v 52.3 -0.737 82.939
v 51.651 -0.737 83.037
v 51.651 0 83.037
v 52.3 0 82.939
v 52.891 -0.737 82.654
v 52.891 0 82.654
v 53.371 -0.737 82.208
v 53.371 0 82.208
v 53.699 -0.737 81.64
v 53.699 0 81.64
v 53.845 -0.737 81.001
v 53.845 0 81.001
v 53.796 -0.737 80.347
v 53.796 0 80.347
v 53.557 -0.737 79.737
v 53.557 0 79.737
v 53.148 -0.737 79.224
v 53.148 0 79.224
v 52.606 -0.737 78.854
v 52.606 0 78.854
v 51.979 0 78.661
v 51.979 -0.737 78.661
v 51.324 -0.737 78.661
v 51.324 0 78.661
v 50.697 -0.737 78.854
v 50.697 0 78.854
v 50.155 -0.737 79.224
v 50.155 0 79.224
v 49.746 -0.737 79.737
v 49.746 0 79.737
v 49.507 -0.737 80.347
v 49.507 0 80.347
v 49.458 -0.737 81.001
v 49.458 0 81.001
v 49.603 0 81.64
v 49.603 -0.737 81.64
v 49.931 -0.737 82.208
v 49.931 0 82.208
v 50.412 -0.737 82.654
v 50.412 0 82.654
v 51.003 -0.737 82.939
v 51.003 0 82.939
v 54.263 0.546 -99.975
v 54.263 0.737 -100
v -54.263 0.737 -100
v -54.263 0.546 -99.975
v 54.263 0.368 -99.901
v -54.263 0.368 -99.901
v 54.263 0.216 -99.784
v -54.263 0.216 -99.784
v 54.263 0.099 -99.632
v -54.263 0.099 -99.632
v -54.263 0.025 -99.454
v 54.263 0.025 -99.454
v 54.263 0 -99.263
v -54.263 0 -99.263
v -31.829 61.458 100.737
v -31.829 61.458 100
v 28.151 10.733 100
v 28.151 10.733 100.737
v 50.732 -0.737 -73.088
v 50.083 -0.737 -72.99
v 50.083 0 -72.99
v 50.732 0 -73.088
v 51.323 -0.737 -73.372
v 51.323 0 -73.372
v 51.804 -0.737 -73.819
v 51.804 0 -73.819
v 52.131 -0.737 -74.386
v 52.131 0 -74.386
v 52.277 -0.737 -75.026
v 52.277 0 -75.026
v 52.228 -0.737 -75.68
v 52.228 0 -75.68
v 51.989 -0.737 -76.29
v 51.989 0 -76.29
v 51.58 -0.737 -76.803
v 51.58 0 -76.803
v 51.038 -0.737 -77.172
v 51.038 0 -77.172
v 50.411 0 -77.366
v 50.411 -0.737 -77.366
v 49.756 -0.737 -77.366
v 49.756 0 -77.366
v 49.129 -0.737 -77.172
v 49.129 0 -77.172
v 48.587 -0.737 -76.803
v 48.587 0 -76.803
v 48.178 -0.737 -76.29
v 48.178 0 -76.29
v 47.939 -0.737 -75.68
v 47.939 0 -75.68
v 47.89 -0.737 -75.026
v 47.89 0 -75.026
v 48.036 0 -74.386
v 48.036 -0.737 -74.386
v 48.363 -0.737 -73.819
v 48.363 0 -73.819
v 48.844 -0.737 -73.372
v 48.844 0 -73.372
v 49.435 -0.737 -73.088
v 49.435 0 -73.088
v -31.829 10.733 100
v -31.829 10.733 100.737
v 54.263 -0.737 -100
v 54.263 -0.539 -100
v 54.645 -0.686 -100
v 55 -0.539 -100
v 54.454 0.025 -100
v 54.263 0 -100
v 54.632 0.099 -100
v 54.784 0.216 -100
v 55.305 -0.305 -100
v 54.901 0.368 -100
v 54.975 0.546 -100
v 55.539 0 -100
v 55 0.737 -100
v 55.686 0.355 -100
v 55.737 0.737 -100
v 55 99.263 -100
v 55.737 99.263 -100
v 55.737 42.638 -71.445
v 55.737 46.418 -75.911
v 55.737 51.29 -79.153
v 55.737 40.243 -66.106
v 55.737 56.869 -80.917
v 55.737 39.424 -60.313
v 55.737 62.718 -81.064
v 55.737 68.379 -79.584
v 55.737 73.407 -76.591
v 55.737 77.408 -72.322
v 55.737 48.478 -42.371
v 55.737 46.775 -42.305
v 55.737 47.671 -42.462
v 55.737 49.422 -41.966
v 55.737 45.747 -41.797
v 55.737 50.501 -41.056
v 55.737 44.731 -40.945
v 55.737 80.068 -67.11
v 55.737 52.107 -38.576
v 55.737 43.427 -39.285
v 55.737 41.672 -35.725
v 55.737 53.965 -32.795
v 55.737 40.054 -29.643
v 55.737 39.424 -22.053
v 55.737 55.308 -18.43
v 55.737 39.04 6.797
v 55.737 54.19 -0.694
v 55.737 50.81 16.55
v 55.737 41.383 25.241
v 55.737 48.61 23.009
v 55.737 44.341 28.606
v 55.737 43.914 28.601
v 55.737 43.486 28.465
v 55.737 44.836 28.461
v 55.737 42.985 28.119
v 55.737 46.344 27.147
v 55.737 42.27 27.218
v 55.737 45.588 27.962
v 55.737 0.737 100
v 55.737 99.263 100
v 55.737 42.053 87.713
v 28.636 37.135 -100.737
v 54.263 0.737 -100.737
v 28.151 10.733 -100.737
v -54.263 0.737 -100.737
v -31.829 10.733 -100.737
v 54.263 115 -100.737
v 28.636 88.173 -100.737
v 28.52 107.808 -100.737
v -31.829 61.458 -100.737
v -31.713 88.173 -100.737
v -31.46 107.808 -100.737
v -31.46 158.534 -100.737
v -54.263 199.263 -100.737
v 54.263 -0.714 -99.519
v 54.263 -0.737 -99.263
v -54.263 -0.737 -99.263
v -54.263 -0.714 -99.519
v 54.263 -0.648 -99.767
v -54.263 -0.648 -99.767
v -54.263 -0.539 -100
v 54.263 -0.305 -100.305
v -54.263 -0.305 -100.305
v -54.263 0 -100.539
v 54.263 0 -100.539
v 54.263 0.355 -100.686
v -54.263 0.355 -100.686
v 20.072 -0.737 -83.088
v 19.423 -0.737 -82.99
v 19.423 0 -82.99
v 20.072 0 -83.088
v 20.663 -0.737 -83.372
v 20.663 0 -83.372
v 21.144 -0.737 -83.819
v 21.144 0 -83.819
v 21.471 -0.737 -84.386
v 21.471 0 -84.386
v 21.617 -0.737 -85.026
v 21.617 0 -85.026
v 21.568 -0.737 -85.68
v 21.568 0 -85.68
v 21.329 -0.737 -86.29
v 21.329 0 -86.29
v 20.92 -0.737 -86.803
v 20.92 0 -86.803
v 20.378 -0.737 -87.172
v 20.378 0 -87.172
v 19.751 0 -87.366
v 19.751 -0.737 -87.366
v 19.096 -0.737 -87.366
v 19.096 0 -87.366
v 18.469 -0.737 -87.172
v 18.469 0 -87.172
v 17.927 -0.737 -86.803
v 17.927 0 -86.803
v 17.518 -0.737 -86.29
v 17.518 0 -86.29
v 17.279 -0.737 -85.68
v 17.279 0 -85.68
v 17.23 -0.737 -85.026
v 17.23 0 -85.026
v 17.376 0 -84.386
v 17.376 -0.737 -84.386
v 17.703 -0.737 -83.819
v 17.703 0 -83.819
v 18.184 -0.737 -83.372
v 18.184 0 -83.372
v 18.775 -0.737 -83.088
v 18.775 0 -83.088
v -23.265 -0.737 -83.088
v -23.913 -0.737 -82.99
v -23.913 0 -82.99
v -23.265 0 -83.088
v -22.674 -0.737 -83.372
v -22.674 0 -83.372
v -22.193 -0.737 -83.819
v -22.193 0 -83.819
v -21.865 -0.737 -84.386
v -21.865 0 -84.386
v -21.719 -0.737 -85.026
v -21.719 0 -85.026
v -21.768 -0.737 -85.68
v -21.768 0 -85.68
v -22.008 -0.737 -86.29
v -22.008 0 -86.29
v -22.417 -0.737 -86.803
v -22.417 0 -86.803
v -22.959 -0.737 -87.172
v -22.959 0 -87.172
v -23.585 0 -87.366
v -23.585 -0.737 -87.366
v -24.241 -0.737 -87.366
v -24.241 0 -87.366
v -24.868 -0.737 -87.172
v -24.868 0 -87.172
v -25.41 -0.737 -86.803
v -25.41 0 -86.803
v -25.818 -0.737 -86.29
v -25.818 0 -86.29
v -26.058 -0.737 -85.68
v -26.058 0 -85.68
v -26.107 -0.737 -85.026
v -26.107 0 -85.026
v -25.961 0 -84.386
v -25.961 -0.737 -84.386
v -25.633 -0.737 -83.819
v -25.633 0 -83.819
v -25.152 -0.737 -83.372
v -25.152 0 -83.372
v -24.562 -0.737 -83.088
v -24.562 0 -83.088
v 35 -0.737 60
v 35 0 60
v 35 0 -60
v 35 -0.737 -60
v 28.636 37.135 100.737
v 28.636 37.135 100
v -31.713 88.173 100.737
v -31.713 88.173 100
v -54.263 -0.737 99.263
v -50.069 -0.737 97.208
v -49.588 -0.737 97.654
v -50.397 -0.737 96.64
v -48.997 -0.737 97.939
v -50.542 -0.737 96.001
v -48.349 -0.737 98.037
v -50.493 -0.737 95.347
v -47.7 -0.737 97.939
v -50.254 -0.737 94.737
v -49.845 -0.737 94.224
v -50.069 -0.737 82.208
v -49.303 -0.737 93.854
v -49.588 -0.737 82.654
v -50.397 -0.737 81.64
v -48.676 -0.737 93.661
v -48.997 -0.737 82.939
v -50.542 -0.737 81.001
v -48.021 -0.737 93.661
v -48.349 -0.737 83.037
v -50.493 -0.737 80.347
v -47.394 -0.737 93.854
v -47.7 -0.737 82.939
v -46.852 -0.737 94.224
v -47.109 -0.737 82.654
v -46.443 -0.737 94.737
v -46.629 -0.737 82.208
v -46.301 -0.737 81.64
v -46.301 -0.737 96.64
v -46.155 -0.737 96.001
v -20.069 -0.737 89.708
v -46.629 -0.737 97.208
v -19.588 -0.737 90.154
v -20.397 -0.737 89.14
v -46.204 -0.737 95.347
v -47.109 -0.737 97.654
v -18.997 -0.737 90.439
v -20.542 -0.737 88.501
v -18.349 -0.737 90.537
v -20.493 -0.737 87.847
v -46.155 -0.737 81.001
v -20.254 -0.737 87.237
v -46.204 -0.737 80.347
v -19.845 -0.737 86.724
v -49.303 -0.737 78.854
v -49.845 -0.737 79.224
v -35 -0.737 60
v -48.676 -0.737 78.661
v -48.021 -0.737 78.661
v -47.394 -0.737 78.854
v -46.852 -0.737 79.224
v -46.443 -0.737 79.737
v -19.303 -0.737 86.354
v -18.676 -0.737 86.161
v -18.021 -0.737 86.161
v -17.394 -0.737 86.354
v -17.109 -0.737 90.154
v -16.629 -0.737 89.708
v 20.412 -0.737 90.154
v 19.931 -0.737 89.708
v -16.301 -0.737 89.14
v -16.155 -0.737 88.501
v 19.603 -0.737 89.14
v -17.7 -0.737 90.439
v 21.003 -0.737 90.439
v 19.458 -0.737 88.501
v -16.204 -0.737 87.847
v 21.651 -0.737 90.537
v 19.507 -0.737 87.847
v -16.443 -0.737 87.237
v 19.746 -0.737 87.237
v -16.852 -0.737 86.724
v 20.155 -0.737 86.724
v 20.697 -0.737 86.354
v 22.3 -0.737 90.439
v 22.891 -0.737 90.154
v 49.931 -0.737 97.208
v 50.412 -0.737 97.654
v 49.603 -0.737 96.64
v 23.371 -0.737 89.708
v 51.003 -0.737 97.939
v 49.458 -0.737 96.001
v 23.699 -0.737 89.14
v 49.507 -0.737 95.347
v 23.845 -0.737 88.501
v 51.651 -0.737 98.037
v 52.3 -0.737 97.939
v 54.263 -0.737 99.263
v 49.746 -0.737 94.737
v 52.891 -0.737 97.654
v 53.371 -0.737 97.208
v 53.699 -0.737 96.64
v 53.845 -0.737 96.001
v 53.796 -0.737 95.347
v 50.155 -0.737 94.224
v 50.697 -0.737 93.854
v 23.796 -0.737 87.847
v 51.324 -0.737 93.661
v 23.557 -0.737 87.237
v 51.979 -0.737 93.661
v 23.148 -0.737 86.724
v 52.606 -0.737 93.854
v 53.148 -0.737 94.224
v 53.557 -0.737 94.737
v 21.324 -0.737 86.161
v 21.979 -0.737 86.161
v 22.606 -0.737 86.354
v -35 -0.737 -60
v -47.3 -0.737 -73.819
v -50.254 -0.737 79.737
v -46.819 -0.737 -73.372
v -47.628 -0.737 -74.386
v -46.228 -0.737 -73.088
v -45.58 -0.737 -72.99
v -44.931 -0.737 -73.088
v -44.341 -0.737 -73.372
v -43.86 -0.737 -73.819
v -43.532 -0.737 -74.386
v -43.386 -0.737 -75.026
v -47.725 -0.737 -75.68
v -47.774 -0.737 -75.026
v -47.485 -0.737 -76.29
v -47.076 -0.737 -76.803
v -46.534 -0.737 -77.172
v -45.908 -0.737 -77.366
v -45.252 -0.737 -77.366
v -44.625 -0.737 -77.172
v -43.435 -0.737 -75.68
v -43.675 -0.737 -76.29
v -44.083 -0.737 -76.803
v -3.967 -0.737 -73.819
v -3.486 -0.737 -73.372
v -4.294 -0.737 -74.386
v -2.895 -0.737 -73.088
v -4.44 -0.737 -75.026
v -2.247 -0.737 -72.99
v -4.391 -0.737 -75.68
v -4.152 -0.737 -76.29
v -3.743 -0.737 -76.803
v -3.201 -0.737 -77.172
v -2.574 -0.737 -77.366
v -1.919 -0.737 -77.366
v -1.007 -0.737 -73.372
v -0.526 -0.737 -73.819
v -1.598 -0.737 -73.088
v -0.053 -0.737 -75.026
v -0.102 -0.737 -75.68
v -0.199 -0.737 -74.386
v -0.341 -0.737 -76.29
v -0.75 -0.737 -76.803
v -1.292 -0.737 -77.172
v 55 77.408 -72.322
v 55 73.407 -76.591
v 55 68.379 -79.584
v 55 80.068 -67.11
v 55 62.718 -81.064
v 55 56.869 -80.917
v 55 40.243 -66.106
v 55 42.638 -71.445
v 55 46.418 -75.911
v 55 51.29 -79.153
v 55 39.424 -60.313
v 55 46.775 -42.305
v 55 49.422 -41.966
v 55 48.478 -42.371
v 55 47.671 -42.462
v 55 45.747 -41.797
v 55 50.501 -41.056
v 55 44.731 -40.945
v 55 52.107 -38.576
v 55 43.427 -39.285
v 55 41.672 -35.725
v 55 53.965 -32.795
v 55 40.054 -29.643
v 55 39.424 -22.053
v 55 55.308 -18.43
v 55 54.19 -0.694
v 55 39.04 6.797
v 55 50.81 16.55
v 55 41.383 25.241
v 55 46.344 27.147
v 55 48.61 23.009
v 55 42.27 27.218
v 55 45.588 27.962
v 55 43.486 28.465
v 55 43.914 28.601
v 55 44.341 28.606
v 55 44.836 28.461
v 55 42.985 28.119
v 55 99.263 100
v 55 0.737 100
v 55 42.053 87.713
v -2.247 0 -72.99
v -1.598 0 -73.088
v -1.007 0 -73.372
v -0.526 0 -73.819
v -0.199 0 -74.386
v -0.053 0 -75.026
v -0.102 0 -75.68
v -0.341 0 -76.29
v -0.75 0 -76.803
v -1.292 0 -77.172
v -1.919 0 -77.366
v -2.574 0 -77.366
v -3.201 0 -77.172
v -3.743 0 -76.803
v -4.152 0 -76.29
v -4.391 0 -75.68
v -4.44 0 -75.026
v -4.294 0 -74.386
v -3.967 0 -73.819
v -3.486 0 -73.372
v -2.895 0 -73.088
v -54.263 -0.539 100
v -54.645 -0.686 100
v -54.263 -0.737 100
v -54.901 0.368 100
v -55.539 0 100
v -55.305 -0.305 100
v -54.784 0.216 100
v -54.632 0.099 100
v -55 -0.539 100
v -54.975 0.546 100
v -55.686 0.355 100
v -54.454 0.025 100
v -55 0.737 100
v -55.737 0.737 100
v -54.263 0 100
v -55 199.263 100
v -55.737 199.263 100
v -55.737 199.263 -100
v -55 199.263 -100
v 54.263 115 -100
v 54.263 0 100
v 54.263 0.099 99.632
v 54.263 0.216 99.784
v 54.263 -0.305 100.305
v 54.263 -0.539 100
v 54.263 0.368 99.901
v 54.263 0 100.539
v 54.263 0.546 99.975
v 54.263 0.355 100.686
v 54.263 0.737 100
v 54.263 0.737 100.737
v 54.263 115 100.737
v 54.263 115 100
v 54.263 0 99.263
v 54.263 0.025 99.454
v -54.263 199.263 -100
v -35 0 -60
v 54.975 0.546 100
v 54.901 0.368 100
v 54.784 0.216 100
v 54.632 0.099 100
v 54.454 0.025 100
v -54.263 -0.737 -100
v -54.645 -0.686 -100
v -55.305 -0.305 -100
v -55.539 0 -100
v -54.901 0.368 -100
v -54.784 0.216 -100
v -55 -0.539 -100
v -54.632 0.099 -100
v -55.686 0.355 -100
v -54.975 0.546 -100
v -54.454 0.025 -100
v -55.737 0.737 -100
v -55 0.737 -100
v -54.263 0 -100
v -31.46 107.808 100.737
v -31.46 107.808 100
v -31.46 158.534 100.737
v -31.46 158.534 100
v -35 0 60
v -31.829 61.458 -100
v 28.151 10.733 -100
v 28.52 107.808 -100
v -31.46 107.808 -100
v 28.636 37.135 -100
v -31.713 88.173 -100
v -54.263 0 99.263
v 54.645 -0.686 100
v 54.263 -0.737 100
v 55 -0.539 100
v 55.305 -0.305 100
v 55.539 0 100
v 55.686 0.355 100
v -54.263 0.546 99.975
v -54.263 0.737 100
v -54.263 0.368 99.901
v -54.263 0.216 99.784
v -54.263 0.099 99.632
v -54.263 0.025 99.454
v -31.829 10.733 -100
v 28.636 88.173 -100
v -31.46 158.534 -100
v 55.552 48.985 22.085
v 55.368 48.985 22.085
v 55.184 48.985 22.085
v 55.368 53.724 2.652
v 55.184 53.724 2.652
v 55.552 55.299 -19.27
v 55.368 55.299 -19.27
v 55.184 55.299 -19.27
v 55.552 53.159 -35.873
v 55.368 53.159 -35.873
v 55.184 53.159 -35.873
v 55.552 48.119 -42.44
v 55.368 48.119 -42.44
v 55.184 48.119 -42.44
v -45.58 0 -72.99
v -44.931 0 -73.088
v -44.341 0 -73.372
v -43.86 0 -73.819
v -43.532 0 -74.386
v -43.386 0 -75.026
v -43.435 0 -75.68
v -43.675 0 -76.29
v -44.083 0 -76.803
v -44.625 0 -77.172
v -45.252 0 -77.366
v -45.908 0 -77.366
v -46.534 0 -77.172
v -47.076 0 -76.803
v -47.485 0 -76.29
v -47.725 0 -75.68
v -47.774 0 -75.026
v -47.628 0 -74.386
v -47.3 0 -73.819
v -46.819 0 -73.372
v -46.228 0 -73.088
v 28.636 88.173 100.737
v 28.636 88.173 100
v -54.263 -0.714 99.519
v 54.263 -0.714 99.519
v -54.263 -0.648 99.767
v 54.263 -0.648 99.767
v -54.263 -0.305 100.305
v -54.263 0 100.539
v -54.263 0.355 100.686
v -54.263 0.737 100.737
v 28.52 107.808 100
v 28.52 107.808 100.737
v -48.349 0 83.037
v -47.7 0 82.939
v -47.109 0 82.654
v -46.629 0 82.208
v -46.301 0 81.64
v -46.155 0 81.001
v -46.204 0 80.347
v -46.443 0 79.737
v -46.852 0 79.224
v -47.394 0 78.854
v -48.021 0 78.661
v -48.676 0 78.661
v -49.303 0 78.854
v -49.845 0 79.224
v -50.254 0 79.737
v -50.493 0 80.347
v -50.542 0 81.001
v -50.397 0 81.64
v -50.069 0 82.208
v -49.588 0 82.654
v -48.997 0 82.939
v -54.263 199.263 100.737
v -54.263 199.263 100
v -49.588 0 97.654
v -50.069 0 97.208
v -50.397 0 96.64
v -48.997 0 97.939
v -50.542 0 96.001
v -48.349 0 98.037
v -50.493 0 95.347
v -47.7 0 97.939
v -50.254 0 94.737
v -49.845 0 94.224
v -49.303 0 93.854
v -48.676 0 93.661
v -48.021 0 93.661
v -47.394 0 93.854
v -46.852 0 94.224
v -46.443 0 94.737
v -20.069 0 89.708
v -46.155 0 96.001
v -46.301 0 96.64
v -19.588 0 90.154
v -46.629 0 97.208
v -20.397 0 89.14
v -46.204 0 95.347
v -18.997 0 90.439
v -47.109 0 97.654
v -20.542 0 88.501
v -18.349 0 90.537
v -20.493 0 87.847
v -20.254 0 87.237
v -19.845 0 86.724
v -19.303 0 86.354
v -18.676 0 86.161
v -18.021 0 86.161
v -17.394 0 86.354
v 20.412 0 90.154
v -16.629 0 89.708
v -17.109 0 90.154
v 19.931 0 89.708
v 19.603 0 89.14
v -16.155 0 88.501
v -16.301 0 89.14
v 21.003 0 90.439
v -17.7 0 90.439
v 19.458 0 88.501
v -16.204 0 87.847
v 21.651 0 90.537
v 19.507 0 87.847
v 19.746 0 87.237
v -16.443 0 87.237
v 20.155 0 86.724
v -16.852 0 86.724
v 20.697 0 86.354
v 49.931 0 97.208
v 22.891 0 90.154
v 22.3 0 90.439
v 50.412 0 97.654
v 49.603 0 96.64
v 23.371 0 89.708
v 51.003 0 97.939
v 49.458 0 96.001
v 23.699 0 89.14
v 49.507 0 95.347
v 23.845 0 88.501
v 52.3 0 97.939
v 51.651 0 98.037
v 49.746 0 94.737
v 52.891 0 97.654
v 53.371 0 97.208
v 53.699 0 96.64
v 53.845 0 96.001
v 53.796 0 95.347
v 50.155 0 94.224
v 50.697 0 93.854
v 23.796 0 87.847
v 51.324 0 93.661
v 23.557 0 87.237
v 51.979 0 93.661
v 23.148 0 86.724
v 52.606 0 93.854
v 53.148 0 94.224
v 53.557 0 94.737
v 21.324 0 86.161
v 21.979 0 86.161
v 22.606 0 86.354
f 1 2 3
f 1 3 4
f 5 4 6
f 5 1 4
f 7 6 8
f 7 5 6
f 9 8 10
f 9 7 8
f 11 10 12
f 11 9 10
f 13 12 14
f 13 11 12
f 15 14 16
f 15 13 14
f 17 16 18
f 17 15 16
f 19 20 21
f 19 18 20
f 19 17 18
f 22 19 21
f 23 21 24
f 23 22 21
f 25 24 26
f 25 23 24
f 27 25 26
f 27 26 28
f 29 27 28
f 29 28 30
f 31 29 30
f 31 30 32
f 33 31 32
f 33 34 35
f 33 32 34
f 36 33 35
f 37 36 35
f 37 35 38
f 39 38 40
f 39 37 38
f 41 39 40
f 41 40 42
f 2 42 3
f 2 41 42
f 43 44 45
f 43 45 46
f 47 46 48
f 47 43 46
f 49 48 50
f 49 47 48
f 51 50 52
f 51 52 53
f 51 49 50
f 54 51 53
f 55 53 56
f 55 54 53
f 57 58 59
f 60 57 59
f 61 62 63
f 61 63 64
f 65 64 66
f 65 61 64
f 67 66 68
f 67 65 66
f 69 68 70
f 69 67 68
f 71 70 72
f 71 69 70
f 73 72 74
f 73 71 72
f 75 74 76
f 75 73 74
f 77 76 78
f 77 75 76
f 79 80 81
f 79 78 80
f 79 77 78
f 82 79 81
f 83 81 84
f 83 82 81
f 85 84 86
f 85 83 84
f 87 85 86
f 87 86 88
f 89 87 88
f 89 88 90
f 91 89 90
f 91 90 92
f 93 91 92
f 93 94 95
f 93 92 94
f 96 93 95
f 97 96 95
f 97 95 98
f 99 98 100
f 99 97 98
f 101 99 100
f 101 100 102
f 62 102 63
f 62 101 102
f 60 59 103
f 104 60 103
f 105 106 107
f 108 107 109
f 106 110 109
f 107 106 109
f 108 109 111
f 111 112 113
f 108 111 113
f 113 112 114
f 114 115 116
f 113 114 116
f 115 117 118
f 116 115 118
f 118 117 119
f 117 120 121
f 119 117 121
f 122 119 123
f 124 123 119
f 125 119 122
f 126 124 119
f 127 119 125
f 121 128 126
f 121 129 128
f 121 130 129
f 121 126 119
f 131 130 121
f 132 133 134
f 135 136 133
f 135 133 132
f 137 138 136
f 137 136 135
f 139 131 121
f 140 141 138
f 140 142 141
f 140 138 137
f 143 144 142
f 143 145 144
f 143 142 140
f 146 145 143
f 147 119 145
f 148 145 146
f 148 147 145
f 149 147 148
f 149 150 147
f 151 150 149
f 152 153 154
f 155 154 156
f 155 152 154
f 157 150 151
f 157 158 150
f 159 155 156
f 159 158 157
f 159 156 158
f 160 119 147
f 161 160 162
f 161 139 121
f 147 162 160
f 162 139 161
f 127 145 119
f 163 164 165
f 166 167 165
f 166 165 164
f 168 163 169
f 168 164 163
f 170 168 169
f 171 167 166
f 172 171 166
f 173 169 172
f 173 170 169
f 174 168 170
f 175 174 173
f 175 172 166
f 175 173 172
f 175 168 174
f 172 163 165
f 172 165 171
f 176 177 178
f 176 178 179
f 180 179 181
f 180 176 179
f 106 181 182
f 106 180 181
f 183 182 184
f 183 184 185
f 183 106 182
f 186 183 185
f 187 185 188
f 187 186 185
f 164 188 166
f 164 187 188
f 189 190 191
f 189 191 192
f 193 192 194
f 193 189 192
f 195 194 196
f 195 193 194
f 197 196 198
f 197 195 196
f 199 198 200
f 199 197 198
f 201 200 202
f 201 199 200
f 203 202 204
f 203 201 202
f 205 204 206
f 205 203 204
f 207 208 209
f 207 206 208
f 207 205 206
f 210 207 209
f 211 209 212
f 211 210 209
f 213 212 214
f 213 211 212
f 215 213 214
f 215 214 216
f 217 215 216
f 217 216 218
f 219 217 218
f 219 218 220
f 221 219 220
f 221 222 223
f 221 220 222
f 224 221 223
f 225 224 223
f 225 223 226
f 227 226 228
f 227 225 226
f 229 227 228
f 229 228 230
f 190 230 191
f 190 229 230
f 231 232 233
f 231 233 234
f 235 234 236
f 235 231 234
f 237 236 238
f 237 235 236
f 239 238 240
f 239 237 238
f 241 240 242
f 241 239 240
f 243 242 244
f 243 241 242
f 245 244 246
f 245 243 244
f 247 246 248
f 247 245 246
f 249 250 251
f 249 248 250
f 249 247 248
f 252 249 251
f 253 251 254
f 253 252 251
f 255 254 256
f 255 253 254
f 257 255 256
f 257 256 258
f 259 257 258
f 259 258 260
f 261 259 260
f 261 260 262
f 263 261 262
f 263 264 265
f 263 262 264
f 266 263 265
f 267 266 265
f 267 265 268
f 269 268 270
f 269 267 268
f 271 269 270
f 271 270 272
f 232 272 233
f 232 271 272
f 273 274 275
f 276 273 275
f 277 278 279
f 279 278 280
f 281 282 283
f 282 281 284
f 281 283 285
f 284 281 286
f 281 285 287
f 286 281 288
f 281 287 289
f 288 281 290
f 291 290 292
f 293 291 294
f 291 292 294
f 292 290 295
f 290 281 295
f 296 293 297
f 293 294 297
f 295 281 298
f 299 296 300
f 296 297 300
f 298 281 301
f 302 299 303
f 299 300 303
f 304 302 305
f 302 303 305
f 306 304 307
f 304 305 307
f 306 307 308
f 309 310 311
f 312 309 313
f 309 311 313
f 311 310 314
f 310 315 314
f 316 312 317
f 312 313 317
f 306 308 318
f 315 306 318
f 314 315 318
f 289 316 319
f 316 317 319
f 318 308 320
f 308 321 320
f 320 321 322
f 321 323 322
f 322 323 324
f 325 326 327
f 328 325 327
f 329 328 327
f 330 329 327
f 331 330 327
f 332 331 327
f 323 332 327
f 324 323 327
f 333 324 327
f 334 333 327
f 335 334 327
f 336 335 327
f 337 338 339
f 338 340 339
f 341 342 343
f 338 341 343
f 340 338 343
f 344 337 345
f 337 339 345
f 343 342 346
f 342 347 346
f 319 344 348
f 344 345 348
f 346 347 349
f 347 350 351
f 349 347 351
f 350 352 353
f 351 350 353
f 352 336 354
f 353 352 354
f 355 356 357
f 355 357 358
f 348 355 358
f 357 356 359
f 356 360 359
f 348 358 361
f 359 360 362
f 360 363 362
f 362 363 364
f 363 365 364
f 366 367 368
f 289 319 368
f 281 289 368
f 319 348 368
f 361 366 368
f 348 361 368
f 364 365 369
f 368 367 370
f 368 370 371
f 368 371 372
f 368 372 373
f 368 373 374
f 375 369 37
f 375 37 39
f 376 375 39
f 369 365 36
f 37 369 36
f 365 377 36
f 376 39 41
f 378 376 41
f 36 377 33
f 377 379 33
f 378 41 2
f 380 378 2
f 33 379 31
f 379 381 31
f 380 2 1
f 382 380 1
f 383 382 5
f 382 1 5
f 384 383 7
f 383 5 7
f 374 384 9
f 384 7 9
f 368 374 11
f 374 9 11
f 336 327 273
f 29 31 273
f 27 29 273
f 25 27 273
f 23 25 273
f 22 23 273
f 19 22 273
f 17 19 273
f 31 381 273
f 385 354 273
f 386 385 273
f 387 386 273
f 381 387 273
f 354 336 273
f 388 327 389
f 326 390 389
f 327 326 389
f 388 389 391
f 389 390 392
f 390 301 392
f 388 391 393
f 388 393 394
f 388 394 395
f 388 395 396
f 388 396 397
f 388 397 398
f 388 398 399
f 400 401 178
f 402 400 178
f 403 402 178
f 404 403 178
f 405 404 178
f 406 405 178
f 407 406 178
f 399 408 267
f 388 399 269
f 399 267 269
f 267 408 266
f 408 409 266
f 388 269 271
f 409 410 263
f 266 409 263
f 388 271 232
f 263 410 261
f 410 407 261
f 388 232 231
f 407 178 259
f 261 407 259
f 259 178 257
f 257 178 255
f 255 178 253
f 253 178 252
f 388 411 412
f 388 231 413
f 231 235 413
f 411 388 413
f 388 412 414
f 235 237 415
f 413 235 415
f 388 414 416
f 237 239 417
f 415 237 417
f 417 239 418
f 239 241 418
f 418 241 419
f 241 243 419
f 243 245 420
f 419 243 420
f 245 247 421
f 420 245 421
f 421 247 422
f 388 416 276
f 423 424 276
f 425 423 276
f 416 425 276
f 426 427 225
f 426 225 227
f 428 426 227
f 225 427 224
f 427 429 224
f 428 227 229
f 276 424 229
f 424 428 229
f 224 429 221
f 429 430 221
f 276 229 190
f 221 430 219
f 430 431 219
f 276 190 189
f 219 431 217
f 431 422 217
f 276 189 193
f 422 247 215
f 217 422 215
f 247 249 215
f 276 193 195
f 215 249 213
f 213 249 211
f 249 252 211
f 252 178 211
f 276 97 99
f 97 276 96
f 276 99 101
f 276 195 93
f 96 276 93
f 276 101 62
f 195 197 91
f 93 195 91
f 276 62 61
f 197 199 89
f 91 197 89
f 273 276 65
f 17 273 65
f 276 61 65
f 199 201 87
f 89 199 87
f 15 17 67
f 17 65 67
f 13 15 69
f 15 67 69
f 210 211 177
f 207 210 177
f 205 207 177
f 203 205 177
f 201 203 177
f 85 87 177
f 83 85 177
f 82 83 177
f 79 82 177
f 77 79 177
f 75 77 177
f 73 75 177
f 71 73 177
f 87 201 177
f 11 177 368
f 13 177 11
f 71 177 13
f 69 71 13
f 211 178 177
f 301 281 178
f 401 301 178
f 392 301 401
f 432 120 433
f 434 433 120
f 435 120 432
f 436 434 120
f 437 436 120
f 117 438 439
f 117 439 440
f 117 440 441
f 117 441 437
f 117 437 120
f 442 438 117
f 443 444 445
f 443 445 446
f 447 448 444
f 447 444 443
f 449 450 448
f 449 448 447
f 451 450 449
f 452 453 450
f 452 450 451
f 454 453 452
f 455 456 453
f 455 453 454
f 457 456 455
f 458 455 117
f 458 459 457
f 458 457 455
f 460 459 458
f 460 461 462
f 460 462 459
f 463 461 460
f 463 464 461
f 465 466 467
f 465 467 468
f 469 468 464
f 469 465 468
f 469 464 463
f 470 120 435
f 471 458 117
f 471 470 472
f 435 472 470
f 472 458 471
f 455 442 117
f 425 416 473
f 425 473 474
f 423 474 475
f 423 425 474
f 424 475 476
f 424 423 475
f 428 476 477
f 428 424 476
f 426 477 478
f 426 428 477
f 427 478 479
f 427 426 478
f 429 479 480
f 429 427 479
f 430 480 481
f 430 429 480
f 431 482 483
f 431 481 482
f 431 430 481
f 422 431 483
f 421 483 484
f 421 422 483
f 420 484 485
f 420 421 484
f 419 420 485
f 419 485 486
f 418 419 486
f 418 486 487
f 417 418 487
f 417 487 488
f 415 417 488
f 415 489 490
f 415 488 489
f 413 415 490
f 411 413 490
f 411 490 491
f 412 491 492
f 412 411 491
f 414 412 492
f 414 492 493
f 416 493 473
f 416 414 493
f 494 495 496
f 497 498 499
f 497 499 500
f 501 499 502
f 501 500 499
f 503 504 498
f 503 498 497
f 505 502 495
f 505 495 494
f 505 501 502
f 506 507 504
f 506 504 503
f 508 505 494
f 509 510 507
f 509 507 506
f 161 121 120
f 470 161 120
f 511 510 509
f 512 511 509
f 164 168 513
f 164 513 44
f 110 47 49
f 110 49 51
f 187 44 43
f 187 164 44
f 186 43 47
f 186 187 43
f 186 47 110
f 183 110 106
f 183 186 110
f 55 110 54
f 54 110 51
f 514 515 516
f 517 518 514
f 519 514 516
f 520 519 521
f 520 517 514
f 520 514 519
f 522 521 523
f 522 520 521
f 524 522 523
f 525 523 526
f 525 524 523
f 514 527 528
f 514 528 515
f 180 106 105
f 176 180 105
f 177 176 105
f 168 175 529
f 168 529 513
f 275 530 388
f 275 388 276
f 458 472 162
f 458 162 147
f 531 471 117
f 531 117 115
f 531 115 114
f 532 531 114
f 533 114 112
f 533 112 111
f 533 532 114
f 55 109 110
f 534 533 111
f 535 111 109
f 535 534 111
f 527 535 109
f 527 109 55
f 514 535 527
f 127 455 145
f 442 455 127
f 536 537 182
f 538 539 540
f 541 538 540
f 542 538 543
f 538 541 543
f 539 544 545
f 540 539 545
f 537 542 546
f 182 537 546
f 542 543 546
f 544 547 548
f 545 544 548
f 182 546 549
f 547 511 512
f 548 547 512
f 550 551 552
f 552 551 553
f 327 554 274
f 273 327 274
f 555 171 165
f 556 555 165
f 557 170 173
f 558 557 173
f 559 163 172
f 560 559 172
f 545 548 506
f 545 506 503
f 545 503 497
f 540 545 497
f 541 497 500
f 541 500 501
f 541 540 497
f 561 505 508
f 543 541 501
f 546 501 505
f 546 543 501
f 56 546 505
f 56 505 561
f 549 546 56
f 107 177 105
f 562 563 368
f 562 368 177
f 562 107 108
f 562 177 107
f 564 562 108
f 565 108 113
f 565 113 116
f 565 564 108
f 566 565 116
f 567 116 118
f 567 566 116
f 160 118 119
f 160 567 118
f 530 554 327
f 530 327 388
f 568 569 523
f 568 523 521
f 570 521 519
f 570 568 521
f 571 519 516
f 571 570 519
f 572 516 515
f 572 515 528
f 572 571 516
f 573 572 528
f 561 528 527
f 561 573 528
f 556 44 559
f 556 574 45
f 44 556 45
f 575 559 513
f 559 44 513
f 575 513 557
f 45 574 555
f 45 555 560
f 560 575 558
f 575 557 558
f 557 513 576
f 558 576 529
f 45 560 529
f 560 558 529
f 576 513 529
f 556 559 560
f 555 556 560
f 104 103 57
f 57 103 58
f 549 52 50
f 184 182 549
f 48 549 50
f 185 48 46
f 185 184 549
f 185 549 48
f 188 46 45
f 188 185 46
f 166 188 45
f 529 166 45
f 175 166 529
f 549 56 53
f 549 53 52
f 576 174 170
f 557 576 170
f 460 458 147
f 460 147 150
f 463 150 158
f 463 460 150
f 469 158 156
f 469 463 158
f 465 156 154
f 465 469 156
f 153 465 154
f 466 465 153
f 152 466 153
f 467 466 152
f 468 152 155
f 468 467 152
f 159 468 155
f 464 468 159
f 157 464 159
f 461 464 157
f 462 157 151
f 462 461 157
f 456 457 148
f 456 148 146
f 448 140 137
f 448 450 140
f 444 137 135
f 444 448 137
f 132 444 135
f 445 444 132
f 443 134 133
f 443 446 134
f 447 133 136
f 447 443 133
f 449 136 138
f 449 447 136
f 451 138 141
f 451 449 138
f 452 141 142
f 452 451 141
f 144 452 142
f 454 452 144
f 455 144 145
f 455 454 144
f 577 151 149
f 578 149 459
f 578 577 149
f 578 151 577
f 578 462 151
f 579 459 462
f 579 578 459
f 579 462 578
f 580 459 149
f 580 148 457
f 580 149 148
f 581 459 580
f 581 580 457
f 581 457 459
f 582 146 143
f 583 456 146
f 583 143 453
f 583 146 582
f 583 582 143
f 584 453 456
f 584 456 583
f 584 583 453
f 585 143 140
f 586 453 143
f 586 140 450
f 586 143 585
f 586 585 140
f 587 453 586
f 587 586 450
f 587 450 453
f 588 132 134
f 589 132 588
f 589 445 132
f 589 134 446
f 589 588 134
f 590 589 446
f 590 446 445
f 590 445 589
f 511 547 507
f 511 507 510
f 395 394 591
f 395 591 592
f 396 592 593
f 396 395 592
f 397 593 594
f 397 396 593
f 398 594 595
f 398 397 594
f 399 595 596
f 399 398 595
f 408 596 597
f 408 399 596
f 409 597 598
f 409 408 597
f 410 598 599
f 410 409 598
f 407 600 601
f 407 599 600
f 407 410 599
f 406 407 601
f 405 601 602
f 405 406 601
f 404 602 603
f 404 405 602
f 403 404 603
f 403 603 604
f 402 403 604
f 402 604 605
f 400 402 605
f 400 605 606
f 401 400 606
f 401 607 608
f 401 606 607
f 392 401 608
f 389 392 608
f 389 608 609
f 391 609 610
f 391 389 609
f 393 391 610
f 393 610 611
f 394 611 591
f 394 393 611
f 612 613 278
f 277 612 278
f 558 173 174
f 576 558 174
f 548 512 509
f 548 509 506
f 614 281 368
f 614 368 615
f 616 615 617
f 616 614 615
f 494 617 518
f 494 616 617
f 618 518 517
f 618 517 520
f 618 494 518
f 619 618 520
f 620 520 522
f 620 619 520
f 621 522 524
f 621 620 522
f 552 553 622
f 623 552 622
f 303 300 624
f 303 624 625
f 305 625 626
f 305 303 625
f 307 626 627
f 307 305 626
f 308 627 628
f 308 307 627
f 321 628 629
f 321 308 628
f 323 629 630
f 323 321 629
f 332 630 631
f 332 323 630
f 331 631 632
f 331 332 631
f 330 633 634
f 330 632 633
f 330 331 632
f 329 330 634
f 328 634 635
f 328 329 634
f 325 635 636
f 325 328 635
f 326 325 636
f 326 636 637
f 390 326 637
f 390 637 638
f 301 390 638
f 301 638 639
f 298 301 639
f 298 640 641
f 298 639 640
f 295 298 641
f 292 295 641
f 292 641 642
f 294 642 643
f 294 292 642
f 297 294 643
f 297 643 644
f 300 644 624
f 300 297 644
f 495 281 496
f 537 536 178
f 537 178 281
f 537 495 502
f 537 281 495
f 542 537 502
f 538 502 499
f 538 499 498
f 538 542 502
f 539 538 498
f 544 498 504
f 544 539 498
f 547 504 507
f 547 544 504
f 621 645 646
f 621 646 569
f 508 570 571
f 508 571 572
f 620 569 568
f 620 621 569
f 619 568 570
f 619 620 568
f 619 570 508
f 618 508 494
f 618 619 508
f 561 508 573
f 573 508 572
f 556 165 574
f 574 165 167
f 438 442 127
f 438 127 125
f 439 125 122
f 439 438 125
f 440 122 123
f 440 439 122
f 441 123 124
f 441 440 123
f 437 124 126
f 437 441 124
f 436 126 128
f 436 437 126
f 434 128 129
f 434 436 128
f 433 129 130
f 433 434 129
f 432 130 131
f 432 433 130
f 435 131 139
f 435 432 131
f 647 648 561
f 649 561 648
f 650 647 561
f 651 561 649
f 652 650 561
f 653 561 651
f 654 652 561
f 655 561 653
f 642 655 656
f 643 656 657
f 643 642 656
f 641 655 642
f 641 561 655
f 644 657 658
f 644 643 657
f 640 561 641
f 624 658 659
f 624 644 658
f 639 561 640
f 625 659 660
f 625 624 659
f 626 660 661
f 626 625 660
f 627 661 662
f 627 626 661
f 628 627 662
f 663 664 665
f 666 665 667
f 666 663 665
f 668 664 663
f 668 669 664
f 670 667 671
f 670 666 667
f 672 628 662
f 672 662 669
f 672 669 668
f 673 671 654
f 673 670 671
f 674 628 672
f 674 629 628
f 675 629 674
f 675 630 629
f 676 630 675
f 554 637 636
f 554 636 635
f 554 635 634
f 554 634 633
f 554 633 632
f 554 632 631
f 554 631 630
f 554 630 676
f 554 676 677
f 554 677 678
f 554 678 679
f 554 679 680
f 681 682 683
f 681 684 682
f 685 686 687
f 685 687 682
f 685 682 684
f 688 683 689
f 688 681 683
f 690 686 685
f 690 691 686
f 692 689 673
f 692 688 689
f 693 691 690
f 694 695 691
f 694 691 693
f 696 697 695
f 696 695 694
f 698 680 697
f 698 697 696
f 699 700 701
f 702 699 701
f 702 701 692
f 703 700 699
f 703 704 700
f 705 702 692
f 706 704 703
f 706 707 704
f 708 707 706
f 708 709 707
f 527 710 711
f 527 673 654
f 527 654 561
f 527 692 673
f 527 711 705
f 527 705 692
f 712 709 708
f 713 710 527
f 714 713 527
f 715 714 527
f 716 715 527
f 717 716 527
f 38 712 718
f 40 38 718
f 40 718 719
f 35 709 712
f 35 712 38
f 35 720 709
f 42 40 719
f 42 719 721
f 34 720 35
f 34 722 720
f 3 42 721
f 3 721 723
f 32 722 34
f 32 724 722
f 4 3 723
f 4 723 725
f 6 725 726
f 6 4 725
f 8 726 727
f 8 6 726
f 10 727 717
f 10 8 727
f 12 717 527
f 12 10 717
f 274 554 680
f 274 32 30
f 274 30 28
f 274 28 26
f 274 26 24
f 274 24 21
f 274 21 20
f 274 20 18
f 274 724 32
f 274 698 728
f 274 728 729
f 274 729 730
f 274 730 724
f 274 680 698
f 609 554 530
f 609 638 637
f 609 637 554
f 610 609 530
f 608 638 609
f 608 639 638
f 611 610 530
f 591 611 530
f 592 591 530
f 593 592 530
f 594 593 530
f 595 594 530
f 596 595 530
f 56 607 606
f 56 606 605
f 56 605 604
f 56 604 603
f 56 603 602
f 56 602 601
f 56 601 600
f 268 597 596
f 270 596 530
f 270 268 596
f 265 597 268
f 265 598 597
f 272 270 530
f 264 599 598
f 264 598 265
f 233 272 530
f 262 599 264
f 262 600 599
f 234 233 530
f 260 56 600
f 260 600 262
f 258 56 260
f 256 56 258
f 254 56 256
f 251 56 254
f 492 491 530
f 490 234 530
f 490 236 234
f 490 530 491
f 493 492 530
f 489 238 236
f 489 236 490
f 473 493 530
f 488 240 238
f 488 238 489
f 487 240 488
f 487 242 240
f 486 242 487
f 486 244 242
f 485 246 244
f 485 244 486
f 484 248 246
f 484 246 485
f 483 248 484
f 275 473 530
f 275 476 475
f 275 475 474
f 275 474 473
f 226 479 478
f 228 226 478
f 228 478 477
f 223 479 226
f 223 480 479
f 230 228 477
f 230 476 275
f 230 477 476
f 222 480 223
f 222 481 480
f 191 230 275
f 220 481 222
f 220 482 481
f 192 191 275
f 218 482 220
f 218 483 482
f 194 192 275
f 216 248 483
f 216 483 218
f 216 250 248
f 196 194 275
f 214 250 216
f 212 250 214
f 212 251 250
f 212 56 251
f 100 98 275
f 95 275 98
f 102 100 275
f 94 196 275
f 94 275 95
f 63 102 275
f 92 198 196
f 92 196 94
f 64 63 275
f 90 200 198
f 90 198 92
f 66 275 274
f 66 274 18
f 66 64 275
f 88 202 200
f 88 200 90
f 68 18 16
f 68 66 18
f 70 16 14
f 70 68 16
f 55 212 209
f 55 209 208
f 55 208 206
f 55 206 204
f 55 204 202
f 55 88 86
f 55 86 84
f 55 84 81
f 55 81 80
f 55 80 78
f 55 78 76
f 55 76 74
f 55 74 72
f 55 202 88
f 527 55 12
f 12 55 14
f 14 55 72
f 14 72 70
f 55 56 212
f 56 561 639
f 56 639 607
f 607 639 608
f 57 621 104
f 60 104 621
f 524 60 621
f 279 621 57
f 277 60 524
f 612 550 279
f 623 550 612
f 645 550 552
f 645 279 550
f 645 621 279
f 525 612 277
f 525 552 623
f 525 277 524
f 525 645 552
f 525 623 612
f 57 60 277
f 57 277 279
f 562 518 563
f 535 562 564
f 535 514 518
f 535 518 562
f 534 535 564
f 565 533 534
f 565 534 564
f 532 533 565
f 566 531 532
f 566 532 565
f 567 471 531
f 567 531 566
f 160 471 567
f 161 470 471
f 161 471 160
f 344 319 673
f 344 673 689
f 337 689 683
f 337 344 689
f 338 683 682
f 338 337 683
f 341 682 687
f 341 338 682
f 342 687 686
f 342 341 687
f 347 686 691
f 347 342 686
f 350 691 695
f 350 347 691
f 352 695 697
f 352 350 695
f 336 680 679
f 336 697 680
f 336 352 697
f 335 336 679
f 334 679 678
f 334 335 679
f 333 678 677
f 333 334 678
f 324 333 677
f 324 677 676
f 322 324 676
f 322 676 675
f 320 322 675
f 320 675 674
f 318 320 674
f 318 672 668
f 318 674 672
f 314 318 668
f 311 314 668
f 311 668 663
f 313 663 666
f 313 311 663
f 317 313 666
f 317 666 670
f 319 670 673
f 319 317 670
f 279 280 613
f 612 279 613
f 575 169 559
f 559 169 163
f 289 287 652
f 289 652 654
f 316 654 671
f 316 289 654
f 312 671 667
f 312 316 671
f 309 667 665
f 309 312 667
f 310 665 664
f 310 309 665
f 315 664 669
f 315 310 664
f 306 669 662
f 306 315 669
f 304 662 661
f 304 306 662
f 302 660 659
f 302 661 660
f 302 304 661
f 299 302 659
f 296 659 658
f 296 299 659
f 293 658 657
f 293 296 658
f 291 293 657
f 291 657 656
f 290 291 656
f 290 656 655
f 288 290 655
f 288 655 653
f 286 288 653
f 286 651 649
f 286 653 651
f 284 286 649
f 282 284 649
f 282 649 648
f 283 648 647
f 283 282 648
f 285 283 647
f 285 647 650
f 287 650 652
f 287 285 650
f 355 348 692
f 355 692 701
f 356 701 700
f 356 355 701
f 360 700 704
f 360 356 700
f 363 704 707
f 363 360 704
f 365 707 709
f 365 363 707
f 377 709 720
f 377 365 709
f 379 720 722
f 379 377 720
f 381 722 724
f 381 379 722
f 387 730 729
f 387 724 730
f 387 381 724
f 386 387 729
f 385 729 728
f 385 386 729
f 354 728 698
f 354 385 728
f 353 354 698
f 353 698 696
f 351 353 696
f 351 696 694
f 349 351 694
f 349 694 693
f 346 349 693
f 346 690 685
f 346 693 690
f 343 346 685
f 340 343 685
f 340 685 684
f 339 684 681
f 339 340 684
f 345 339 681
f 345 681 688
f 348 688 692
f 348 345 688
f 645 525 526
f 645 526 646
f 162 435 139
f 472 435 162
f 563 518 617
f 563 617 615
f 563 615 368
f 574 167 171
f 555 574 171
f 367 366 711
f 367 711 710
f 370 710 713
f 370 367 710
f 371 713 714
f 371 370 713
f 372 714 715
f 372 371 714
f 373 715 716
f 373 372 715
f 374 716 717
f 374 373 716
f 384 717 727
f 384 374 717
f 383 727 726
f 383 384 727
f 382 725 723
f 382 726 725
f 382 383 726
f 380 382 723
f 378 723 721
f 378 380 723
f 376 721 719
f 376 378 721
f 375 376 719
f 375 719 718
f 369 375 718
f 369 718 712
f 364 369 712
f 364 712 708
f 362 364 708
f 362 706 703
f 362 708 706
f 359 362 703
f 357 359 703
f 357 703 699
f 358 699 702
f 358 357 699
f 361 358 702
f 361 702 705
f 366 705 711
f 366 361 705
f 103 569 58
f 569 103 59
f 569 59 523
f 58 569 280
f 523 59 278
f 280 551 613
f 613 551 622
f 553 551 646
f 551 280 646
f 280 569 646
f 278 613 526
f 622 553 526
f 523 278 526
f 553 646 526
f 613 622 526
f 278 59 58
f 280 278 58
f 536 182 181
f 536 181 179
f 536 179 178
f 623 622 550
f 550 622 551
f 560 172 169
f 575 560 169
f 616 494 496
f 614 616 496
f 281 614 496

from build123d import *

# Parameters (mm, degrees)
SKETCH1_W                    = 110
SKETCH1_H                    = 200
SKETCH1_W_2                  = 70
SKETCH1_H_2                  = 120
BASE_FLANGE1_DEPTH           = 0.7366
EDGE_FLANGE1_STRIP_W         = 4.4196
EDGE_FLANGE1_STRIP_H         = 0.7366
EDGE_FLANGE1_STRIP_CUT_DEPTH = 200
EDGE_FLANGE1_DEPTH           = 200
EDGE_FLANGE2_STRIP_W         = 4.4196
EDGE_FLANGE2_STRIP_H         = 0.7366
EDGE_FLANGE2_STRIP_CUT_DEPTH = 200
EDGE_FLANGE2_DEPTH           = 200
EDGE_FLANGE3_STRIP_W         = 4.4196
EDGE_FLANGE3_STRIP_H         = 0.7366
EDGE_FLANGE3_STRIP_CUT_DEPTH = 108.5268
EDGE_FLANGE3_DEPTH           = 108.5268
EDGE_FLANGE3_START           = 0.7366
EDGE_FLANGE3_FLAT_DEPTH      = 0.7366
EDGE_FLANGE4_STRIP_W         = 4.4196
EDGE_FLANGE4_STRIP_H         = 0.7366
EDGE_FLANGE4_STRIP_CUT_DEPTH = 108.5268
EDGE_FLANGE4_DEPTH           = 108.5268
EDGE_FLANGE4_START           = 0.7366
EDGE_FLANGE4_FLAT_DEPTH      = 0.7366
CUT_EXTRUDE2_DEPTH           = 289.797370967
CUT_EXTRUDE3_START           = -0.7366
CUT_EXTRUDE3_DEPTH           = 0.7366
CUT_EXTRUDE6_DEPTH           = 800.082459726
CUT_EXTRUDE6_DEPTH_BACK      = 800.082459726
SKETCH53_R                   = 2.2
SKETCH53_R_2                 = 2.199999998


# Read off the part's stored shape, not the designer's step: Cut-Extrude3
# Sheet-metal steps are written as plain solids
with BuildPart() as part:
    # Sketch1 → Base-Flange1 (new body)
    with BuildSketch(Plane(origin=(0, 0, 0), x_dir=(1, 0, 0), z_dir=(0, 1, 0))):
        Rectangle(SKETCH1_W, SKETCH1_H)
        Rectangle(SKETCH1_W_2, SKETCH1_H_2, mode=Mode.SUBTRACT)
    extrude(amount=-BASE_FLANGE1_DEPTH)

    # Edge-Flange1 strip (across the edge) → Edge-Flange1 strip cut (cut)
    with BuildSketch(Plane(origin=(-55, 0, -100), x_dir=(1, 0, 0), z_dir=(0, 0, 1))):
        with Locations((-1.4732, -0.3683)):
            Rectangle(EDGE_FLANGE1_STRIP_W, EDGE_FLANGE1_STRIP_H)
    extrude(amount=EDGE_FLANGE1_STRIP_CUT_DEPTH, mode=Mode.SUBTRACT)

    # Edge-Flange1 section (across the edge) → Edge-Flange1 (add)
    with BuildSketch(Plane(origin=(-55, 0, -100), x_dir=(1, 0, 0), z_dir=(0, 0, 1))):
        with BuildLine():
            Line((-0.7366, 0.7366), (-0.7366, 199.2634))
            Line((-0.7366, 199.2634), (0, 199.2634))
            Line((0, 199.2634), (0, 0.7366))
            ThreePointArc((0, 0.7366), (0.215745145, 0.215745145), (0.7366, 0))
            Line((0.7366, 0), (0.7366, -0.7366))
            ThreePointArc((0.7366, -0.7366), (-0.30510971, -0.30510971), (-0.7366, 0.7366))
        make_face()
    extrude(amount=EDGE_FLANGE1_DEPTH)

    # Edge-Flange2 strip (across the edge) → Edge-Flange2 strip cut (cut)
    with BuildSketch(Plane(origin=(55, 0, 100), x_dir=(-1, 0, 0), z_dir=(0, 0, -1))):
        with Locations((-1.4732, -0.3683)):
            Rectangle(EDGE_FLANGE2_STRIP_W, EDGE_FLANGE2_STRIP_H)
    extrude(amount=EDGE_FLANGE2_STRIP_CUT_DEPTH, mode=Mode.SUBTRACT)

    # Edge-Flange2 section (across the edge) → Edge-Flange2 (add)
    with BuildSketch(Plane(origin=(55, 0, 100), x_dir=(-1, 0, 0), z_dir=(0, 0, -1))):
        with BuildLine():
            Line((-0.7366, 0.7366), (-0.7366, 99.2634))
            Line((-0.7366, 99.2634), (0, 99.2634))
            Line((0, 99.2634), (0, 0.7366))
            ThreePointArc((0, 0.7366), (0.215745145, 0.215745145), (0.7366, 0))
            Line((0.7366, 0), (0.7366, -0.7366))
            ThreePointArc((0.7366, -0.7366), (-0.30510971, -0.30510971), (-0.7366, 0.7366))
        make_face()
    extrude(amount=EDGE_FLANGE2_DEPTH)

    # Edge-Flange3 strip (across the edge) → Edge-Flange3 strip cut (cut)
    with BuildSketch(Plane(origin=(54.2634, 0, -100), x_dir=(0, 0, 1), z_dir=(-1, 0, 0))):
        with Locations((-1.4732, -0.3683)):
            Rectangle(EDGE_FLANGE3_STRIP_W, EDGE_FLANGE3_STRIP_H)
    extrude(amount=EDGE_FLANGE3_STRIP_CUT_DEPTH, mode=Mode.SUBTRACT)

    # Edge-Flange3 bend section (across the edge) → Edge-Flange3 (add)
    with BuildSketch(Plane(origin=(54.2634, 0, -100), x_dir=(0, 0, 1), z_dir=(-1, 0, 0))):
        with BuildLine():
            Line((-0.7366, 0.7366), (0, 0.7366))
            ThreePointArc((0, 0.7366), (0.215745145, 0.215745145), (0.7366, 0))
            Line((0.7366, 0), (0.7366, -0.7366))
            ThreePointArc((0.7366, -0.7366), (-0.30510971, -0.30510971), (-0.7366, 0.7366))
        make_face()
    extrude(amount=EDGE_FLANGE3_DEPTH)

    # Edge-Flange3 profile (on flange) → Edge-Flange3 flat (add)
    with BuildSketch(Plane(origin=(0, 0, -100), x_dir=(-1, 0, 0), z_dir=(0, 0, -1)).offset(EDGE_FLANGE3_START)):
        Polygon((-54.2634, 115), (-54.2634, 0.7366), (54.2634, 0.7366), (54.2634, 199.2634), align=None)
    extrude(amount=-EDGE_FLANGE3_FLAT_DEPTH)

    # Edge-Flange4 strip (across the edge) → Edge-Flange4 strip cut (cut)
    with BuildSketch(Plane(origin=(-54.2634, 0, 100), x_dir=(0, 0, -1), z_dir=(1, 0, 0))):
        with Locations((-1.4732, -0.3683)):
            Rectangle(EDGE_FLANGE4_STRIP_W, EDGE_FLANGE4_STRIP_H)
    extrude(amount=EDGE_FLANGE4_STRIP_CUT_DEPTH, mode=Mode.SUBTRACT)

    # Edge-Flange4 bend section (across the edge) → Edge-Flange4 (add)
    with BuildSketch(Plane(origin=(-54.2634, 0, 100), x_dir=(0, 0, -1), z_dir=(1, 0, 0))):
        with BuildLine():
            Line((-0.7366, 0.7366), (0, 0.7366))
            ThreePointArc((0, 0.7366), (0.215745145, 0.215745145), (0.7366, 0))
            Line((0.7366, 0), (0.7366, -0.7366))
            ThreePointArc((0.7366, -0.7366), (-0.30510971, -0.30510971), (-0.7366, 0.7366))
        make_face()
    extrude(amount=EDGE_FLANGE4_DEPTH)

    # Edge-Flange4 profile (on flange) → Edge-Flange4 flat (add)
    with BuildSketch(Plane.XY.offset(100).offset(EDGE_FLANGE4_START)):
        Polygon((-54.2634, 199.2634), (-54.2634, 0.7366), (54.2634, 0.7366), (54.2634, 115), align=None)
    extrude(amount=-EDGE_FLANGE4_FLAT_DEPTH)

    # Sketch24 → Cut-Extrude2 (cut, through all)
    with BuildSketch(Plane(origin=(0, 0, -100.7366), x_dir=(-1, 0, 0), z_dir=(0, 0, -1))):
        Polygon((-28.519875042, 107.808063094), (31.460124178, 107.808063094), (31.460124178, 158.533542729), align=None)
        Polygon((-28.150641863, 10.732953924), (31.829357358, 10.732953924), (31.829357358, 61.45843356), align=None)
        Polygon((31.713150602, 88.173102361), (-28.636081798, 88.173102361), (-28.636081798, 37.135359798), align=None)
    extrude(amount=-CUT_EXTRUDE2_DEPTH, mode=Mode.SUBTRACT)

    # Cut-Extrude3 outline → Cut-Extrude3 (cut)
    with BuildSketch(Plane(origin=(55.7366, 0, 0), x_dir=(0, 0, -1), z_dir=(1, 0, 0)).offset(CUT_EXTRUDE3_START)):
        with BuildLine():
            Line((-87.713422796, 42.053472661), (-6.797155753, 39.040000774))
            add(Edge.make_bspline(
                [(-6.797155753, 39.040000774), (-87.713422796, 42.053472661), (67.110125935, 80.068334048), (60.312641059, 39.424036929), (22.052524279, 39.424036929)],
                knots=[0, 0, 0, 0, 0, 1, 1, 1, 1, 1], degree=4))
            Line((22.052524279, 39.424036929), (60.312641059, 39.424036929))
            ThreePointArc((60.312641059, 39.424036929), (80.917037974, 56.86865569), (67.110125935, 80.068334048))
            Line((67.110125935, 80.068334048), (-87.713422796, 42.053472661))
        make_face()
    extrude(amount=CUT_EXTRUDE3_DEPTH, mode=Mode.SUBTRACT)

    # Sketch53 → Cut-Extrude6 (cut, two sides: drawn at the far end of the back side and taken through both)
    with BuildSketch(Plane(origin=(344.115063699, 0, 561.793038506), x_dir=(-1, 0, 0), z_dir=(0, 1, 0)).offset(-CUT_EXTRUDE6_DEPTH_BACK)):
        with Locations(Location((392.463649434, -480.956438506, 0), (0, 0, 90))):
            Circle(SKETCH53_R)
        with Locations(Location((392.463649434, -465.956438506, 0), (0, 0, 90))):
            Circle(SKETCH53_R)
        with Locations(Location((362.463649434, -473.456438506, 0), (0, 0, 90))):
            Circle(SKETCH53_R)
        with Locations(Location((292.463649434, -480.956438506, 0), (0, 0, 90))):
            Circle(SKETCH53_R)
        with Locations(Location((292.463649434, -465.956438506, 0), (0, 0, 90))):
            Circle(SKETCH53_R)
        with Locations(Location((322.463649434, -473.456438506, 0), (0, 0, 90))):
            Circle(SKETCH53_R)
        with Locations(Location((294.03158687, -636.983238506, 0), (0, 0, 90))):
            Circle(SKETCH53_R_2)
        with Locations(Location((324.69158687, -646.983238506, 0), (0, 0, 90))):
            Circle(SKETCH53_R_2)
        with Locations(Location((346.36158687, -636.983238506, 0), (0, 0, 90))):
            Circle(SKETCH53_R_2)
        with Locations(Location((368.028253537, -646.983238506, 0), (0, 0, 90))):
            Circle(SKETCH53_R_2)
        with Locations(Location((389.694920203, -636.983238506, 0), (0, 0, 90))):
            Circle(SKETCH53_R_2)
    extrude(amount=CUT_EXTRUDE6_DEPTH + CUT_EXTRUDE6_DEPTH_BACK, mode=Mode.SUBTRACT)


solid = part.part
